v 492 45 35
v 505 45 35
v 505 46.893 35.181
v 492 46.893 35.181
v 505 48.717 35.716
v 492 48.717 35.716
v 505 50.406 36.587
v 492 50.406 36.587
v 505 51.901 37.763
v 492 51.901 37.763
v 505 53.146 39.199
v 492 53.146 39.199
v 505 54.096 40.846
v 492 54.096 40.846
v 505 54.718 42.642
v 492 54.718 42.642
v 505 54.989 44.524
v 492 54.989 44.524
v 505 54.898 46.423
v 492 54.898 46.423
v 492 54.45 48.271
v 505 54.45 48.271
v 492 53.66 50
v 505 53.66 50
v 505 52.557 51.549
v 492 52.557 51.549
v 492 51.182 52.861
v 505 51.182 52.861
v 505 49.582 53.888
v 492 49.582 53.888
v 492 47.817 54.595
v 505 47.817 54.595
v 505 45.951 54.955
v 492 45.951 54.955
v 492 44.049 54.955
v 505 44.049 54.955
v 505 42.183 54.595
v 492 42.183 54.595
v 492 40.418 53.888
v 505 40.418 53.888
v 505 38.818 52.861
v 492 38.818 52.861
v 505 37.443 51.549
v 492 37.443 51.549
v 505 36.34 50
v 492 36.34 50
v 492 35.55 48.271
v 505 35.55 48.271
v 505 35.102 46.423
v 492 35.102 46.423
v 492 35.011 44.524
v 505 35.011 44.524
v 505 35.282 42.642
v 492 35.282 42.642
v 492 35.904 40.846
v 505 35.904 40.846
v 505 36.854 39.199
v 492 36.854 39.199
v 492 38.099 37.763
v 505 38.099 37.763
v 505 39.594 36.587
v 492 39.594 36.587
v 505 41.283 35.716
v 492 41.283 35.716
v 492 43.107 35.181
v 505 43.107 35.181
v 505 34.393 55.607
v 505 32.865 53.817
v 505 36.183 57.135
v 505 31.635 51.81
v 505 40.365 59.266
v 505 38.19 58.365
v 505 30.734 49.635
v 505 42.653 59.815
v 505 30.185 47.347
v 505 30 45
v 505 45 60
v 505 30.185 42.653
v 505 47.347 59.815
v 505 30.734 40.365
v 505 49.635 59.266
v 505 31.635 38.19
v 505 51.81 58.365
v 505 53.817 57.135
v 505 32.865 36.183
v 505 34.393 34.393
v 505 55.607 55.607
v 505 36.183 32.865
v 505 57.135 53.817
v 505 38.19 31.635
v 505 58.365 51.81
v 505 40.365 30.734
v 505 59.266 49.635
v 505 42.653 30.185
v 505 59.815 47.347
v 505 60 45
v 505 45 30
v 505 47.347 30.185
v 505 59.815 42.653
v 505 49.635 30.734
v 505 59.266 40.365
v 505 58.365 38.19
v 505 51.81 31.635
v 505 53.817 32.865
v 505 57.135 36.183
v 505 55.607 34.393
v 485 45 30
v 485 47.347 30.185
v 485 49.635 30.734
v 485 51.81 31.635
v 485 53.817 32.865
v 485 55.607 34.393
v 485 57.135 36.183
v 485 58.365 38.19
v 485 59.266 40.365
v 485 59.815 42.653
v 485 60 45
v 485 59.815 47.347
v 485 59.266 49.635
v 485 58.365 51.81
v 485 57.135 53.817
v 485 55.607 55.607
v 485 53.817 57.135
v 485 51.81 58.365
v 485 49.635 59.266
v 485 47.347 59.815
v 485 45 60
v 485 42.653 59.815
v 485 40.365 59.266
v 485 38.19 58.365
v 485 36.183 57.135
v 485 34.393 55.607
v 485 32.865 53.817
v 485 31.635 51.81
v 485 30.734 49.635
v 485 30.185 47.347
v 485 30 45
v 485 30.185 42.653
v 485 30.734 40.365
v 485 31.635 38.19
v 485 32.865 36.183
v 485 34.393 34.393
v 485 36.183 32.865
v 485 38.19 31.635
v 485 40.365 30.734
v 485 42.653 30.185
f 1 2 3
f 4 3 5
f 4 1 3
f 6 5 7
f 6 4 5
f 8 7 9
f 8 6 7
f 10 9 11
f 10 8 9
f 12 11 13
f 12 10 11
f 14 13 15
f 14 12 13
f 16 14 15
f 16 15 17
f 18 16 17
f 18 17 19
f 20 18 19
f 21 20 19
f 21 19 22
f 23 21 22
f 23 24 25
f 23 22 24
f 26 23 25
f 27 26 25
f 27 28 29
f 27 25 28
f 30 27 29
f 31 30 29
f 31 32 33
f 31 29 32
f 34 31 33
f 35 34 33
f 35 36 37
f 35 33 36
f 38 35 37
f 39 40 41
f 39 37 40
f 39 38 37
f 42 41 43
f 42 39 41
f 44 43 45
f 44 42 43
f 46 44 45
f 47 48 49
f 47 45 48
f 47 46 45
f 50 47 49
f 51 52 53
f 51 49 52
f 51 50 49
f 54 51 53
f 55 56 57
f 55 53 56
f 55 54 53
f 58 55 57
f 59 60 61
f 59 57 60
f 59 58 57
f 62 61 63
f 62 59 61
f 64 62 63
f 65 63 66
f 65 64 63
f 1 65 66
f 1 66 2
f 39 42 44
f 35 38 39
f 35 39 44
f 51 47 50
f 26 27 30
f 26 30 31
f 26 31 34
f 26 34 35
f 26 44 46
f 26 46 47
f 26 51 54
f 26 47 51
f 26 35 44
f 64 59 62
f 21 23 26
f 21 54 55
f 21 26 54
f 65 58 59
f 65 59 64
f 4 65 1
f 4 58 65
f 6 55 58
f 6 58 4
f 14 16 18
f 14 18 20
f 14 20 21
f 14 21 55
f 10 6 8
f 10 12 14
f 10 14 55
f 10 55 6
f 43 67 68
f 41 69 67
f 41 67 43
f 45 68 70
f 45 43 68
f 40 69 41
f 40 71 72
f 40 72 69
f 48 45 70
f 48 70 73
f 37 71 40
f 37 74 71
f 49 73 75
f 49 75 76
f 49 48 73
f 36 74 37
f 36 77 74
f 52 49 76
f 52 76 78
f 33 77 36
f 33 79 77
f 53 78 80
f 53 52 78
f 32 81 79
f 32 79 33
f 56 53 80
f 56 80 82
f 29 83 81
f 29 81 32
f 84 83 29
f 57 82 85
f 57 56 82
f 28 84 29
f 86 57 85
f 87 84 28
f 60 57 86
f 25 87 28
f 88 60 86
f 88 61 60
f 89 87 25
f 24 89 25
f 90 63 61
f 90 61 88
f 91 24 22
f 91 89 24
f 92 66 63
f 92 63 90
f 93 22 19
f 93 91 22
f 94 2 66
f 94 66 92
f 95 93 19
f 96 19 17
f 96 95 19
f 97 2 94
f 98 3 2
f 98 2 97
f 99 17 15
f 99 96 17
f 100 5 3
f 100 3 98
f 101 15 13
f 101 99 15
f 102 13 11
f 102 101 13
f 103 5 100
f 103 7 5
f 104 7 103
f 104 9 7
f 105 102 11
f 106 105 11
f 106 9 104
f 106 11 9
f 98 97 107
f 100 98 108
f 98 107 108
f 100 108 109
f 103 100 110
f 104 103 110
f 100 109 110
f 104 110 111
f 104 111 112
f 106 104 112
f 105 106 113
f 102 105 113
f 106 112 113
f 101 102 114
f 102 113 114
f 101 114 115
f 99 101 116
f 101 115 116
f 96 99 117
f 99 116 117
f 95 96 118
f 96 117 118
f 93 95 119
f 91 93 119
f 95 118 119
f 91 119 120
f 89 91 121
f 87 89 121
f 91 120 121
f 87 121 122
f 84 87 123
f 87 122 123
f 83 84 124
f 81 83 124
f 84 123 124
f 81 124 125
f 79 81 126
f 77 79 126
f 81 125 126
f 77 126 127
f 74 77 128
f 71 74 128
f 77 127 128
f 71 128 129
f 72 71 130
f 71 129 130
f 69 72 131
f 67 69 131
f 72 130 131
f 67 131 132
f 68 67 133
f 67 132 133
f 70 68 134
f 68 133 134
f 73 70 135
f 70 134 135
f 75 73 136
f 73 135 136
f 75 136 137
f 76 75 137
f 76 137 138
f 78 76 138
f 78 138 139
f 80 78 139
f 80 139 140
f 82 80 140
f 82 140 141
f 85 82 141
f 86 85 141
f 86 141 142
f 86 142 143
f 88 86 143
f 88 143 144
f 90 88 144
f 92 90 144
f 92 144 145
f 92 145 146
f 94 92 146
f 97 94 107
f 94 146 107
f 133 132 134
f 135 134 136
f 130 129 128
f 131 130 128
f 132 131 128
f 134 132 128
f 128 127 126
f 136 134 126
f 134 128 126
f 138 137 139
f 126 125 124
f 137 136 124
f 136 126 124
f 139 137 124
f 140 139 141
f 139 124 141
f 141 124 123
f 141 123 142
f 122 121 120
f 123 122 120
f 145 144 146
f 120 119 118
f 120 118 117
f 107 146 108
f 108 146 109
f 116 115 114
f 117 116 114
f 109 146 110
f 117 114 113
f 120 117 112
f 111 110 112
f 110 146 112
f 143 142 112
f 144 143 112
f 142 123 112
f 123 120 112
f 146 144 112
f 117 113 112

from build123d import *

# Parameters (mm, degrees)
CYLINDER029_R           = 10
CYLINDER029_DEPTH       = 16
CYLINDER029_PITCH_ANGLE = 90
CYLINDER028_R           = 15
CYLINDER028_DEPTH       = 20
CYLINDER028_PITCH_ANGLE = 90


with BuildPart() as cylinder029:
    # Cylinder029 → Cylinder029 (new body)
    with BuildSketch(Plane.XY):
        Circle(CYLINDER029_R)
    extrude(amount=CYLINDER029_DEPTH)


with BuildPart() as cylinder029_1:
    # Cylinder029 pitch: moved
    add(cylinder029.part.rotate(Axis((0, 0, 0), (0, 1, 0)), CYLINDER029_PITCH_ANGLE))


with BuildPart() as cylinder029_2:
    # Cylinder029 placement: moved
    add(cylinder029_1.part.moved(Location((492, 45, 45))))


with BuildPart() as micro_grid_plug:
    # Cylinder028 → Cylinder028 (new body)
    with BuildSketch(Plane.XY):
        Circle(CYLINDER028_R)
    extrude(amount=CYLINDER028_DEPTH)


with BuildPart() as micro_grid_plug_1:
    # Cylinder028 pitch: moved
    add(micro_grid_plug.part.rotate(Axis((0, 0, 0), (0, 1, 0)), CYLINDER028_PITCH_ANGLE))


with BuildPart() as micro_grid_plug_2:
    # Cylinder028 placement: moved
    add(micro_grid_plug_1.part.moved(Location((485, 45, 45))))

    # Cut015: cut Cylinder029
    add(cylinder029_2.part, mode=Mode.SUBTRACT)


solid = micro_grid_plug_2.part
